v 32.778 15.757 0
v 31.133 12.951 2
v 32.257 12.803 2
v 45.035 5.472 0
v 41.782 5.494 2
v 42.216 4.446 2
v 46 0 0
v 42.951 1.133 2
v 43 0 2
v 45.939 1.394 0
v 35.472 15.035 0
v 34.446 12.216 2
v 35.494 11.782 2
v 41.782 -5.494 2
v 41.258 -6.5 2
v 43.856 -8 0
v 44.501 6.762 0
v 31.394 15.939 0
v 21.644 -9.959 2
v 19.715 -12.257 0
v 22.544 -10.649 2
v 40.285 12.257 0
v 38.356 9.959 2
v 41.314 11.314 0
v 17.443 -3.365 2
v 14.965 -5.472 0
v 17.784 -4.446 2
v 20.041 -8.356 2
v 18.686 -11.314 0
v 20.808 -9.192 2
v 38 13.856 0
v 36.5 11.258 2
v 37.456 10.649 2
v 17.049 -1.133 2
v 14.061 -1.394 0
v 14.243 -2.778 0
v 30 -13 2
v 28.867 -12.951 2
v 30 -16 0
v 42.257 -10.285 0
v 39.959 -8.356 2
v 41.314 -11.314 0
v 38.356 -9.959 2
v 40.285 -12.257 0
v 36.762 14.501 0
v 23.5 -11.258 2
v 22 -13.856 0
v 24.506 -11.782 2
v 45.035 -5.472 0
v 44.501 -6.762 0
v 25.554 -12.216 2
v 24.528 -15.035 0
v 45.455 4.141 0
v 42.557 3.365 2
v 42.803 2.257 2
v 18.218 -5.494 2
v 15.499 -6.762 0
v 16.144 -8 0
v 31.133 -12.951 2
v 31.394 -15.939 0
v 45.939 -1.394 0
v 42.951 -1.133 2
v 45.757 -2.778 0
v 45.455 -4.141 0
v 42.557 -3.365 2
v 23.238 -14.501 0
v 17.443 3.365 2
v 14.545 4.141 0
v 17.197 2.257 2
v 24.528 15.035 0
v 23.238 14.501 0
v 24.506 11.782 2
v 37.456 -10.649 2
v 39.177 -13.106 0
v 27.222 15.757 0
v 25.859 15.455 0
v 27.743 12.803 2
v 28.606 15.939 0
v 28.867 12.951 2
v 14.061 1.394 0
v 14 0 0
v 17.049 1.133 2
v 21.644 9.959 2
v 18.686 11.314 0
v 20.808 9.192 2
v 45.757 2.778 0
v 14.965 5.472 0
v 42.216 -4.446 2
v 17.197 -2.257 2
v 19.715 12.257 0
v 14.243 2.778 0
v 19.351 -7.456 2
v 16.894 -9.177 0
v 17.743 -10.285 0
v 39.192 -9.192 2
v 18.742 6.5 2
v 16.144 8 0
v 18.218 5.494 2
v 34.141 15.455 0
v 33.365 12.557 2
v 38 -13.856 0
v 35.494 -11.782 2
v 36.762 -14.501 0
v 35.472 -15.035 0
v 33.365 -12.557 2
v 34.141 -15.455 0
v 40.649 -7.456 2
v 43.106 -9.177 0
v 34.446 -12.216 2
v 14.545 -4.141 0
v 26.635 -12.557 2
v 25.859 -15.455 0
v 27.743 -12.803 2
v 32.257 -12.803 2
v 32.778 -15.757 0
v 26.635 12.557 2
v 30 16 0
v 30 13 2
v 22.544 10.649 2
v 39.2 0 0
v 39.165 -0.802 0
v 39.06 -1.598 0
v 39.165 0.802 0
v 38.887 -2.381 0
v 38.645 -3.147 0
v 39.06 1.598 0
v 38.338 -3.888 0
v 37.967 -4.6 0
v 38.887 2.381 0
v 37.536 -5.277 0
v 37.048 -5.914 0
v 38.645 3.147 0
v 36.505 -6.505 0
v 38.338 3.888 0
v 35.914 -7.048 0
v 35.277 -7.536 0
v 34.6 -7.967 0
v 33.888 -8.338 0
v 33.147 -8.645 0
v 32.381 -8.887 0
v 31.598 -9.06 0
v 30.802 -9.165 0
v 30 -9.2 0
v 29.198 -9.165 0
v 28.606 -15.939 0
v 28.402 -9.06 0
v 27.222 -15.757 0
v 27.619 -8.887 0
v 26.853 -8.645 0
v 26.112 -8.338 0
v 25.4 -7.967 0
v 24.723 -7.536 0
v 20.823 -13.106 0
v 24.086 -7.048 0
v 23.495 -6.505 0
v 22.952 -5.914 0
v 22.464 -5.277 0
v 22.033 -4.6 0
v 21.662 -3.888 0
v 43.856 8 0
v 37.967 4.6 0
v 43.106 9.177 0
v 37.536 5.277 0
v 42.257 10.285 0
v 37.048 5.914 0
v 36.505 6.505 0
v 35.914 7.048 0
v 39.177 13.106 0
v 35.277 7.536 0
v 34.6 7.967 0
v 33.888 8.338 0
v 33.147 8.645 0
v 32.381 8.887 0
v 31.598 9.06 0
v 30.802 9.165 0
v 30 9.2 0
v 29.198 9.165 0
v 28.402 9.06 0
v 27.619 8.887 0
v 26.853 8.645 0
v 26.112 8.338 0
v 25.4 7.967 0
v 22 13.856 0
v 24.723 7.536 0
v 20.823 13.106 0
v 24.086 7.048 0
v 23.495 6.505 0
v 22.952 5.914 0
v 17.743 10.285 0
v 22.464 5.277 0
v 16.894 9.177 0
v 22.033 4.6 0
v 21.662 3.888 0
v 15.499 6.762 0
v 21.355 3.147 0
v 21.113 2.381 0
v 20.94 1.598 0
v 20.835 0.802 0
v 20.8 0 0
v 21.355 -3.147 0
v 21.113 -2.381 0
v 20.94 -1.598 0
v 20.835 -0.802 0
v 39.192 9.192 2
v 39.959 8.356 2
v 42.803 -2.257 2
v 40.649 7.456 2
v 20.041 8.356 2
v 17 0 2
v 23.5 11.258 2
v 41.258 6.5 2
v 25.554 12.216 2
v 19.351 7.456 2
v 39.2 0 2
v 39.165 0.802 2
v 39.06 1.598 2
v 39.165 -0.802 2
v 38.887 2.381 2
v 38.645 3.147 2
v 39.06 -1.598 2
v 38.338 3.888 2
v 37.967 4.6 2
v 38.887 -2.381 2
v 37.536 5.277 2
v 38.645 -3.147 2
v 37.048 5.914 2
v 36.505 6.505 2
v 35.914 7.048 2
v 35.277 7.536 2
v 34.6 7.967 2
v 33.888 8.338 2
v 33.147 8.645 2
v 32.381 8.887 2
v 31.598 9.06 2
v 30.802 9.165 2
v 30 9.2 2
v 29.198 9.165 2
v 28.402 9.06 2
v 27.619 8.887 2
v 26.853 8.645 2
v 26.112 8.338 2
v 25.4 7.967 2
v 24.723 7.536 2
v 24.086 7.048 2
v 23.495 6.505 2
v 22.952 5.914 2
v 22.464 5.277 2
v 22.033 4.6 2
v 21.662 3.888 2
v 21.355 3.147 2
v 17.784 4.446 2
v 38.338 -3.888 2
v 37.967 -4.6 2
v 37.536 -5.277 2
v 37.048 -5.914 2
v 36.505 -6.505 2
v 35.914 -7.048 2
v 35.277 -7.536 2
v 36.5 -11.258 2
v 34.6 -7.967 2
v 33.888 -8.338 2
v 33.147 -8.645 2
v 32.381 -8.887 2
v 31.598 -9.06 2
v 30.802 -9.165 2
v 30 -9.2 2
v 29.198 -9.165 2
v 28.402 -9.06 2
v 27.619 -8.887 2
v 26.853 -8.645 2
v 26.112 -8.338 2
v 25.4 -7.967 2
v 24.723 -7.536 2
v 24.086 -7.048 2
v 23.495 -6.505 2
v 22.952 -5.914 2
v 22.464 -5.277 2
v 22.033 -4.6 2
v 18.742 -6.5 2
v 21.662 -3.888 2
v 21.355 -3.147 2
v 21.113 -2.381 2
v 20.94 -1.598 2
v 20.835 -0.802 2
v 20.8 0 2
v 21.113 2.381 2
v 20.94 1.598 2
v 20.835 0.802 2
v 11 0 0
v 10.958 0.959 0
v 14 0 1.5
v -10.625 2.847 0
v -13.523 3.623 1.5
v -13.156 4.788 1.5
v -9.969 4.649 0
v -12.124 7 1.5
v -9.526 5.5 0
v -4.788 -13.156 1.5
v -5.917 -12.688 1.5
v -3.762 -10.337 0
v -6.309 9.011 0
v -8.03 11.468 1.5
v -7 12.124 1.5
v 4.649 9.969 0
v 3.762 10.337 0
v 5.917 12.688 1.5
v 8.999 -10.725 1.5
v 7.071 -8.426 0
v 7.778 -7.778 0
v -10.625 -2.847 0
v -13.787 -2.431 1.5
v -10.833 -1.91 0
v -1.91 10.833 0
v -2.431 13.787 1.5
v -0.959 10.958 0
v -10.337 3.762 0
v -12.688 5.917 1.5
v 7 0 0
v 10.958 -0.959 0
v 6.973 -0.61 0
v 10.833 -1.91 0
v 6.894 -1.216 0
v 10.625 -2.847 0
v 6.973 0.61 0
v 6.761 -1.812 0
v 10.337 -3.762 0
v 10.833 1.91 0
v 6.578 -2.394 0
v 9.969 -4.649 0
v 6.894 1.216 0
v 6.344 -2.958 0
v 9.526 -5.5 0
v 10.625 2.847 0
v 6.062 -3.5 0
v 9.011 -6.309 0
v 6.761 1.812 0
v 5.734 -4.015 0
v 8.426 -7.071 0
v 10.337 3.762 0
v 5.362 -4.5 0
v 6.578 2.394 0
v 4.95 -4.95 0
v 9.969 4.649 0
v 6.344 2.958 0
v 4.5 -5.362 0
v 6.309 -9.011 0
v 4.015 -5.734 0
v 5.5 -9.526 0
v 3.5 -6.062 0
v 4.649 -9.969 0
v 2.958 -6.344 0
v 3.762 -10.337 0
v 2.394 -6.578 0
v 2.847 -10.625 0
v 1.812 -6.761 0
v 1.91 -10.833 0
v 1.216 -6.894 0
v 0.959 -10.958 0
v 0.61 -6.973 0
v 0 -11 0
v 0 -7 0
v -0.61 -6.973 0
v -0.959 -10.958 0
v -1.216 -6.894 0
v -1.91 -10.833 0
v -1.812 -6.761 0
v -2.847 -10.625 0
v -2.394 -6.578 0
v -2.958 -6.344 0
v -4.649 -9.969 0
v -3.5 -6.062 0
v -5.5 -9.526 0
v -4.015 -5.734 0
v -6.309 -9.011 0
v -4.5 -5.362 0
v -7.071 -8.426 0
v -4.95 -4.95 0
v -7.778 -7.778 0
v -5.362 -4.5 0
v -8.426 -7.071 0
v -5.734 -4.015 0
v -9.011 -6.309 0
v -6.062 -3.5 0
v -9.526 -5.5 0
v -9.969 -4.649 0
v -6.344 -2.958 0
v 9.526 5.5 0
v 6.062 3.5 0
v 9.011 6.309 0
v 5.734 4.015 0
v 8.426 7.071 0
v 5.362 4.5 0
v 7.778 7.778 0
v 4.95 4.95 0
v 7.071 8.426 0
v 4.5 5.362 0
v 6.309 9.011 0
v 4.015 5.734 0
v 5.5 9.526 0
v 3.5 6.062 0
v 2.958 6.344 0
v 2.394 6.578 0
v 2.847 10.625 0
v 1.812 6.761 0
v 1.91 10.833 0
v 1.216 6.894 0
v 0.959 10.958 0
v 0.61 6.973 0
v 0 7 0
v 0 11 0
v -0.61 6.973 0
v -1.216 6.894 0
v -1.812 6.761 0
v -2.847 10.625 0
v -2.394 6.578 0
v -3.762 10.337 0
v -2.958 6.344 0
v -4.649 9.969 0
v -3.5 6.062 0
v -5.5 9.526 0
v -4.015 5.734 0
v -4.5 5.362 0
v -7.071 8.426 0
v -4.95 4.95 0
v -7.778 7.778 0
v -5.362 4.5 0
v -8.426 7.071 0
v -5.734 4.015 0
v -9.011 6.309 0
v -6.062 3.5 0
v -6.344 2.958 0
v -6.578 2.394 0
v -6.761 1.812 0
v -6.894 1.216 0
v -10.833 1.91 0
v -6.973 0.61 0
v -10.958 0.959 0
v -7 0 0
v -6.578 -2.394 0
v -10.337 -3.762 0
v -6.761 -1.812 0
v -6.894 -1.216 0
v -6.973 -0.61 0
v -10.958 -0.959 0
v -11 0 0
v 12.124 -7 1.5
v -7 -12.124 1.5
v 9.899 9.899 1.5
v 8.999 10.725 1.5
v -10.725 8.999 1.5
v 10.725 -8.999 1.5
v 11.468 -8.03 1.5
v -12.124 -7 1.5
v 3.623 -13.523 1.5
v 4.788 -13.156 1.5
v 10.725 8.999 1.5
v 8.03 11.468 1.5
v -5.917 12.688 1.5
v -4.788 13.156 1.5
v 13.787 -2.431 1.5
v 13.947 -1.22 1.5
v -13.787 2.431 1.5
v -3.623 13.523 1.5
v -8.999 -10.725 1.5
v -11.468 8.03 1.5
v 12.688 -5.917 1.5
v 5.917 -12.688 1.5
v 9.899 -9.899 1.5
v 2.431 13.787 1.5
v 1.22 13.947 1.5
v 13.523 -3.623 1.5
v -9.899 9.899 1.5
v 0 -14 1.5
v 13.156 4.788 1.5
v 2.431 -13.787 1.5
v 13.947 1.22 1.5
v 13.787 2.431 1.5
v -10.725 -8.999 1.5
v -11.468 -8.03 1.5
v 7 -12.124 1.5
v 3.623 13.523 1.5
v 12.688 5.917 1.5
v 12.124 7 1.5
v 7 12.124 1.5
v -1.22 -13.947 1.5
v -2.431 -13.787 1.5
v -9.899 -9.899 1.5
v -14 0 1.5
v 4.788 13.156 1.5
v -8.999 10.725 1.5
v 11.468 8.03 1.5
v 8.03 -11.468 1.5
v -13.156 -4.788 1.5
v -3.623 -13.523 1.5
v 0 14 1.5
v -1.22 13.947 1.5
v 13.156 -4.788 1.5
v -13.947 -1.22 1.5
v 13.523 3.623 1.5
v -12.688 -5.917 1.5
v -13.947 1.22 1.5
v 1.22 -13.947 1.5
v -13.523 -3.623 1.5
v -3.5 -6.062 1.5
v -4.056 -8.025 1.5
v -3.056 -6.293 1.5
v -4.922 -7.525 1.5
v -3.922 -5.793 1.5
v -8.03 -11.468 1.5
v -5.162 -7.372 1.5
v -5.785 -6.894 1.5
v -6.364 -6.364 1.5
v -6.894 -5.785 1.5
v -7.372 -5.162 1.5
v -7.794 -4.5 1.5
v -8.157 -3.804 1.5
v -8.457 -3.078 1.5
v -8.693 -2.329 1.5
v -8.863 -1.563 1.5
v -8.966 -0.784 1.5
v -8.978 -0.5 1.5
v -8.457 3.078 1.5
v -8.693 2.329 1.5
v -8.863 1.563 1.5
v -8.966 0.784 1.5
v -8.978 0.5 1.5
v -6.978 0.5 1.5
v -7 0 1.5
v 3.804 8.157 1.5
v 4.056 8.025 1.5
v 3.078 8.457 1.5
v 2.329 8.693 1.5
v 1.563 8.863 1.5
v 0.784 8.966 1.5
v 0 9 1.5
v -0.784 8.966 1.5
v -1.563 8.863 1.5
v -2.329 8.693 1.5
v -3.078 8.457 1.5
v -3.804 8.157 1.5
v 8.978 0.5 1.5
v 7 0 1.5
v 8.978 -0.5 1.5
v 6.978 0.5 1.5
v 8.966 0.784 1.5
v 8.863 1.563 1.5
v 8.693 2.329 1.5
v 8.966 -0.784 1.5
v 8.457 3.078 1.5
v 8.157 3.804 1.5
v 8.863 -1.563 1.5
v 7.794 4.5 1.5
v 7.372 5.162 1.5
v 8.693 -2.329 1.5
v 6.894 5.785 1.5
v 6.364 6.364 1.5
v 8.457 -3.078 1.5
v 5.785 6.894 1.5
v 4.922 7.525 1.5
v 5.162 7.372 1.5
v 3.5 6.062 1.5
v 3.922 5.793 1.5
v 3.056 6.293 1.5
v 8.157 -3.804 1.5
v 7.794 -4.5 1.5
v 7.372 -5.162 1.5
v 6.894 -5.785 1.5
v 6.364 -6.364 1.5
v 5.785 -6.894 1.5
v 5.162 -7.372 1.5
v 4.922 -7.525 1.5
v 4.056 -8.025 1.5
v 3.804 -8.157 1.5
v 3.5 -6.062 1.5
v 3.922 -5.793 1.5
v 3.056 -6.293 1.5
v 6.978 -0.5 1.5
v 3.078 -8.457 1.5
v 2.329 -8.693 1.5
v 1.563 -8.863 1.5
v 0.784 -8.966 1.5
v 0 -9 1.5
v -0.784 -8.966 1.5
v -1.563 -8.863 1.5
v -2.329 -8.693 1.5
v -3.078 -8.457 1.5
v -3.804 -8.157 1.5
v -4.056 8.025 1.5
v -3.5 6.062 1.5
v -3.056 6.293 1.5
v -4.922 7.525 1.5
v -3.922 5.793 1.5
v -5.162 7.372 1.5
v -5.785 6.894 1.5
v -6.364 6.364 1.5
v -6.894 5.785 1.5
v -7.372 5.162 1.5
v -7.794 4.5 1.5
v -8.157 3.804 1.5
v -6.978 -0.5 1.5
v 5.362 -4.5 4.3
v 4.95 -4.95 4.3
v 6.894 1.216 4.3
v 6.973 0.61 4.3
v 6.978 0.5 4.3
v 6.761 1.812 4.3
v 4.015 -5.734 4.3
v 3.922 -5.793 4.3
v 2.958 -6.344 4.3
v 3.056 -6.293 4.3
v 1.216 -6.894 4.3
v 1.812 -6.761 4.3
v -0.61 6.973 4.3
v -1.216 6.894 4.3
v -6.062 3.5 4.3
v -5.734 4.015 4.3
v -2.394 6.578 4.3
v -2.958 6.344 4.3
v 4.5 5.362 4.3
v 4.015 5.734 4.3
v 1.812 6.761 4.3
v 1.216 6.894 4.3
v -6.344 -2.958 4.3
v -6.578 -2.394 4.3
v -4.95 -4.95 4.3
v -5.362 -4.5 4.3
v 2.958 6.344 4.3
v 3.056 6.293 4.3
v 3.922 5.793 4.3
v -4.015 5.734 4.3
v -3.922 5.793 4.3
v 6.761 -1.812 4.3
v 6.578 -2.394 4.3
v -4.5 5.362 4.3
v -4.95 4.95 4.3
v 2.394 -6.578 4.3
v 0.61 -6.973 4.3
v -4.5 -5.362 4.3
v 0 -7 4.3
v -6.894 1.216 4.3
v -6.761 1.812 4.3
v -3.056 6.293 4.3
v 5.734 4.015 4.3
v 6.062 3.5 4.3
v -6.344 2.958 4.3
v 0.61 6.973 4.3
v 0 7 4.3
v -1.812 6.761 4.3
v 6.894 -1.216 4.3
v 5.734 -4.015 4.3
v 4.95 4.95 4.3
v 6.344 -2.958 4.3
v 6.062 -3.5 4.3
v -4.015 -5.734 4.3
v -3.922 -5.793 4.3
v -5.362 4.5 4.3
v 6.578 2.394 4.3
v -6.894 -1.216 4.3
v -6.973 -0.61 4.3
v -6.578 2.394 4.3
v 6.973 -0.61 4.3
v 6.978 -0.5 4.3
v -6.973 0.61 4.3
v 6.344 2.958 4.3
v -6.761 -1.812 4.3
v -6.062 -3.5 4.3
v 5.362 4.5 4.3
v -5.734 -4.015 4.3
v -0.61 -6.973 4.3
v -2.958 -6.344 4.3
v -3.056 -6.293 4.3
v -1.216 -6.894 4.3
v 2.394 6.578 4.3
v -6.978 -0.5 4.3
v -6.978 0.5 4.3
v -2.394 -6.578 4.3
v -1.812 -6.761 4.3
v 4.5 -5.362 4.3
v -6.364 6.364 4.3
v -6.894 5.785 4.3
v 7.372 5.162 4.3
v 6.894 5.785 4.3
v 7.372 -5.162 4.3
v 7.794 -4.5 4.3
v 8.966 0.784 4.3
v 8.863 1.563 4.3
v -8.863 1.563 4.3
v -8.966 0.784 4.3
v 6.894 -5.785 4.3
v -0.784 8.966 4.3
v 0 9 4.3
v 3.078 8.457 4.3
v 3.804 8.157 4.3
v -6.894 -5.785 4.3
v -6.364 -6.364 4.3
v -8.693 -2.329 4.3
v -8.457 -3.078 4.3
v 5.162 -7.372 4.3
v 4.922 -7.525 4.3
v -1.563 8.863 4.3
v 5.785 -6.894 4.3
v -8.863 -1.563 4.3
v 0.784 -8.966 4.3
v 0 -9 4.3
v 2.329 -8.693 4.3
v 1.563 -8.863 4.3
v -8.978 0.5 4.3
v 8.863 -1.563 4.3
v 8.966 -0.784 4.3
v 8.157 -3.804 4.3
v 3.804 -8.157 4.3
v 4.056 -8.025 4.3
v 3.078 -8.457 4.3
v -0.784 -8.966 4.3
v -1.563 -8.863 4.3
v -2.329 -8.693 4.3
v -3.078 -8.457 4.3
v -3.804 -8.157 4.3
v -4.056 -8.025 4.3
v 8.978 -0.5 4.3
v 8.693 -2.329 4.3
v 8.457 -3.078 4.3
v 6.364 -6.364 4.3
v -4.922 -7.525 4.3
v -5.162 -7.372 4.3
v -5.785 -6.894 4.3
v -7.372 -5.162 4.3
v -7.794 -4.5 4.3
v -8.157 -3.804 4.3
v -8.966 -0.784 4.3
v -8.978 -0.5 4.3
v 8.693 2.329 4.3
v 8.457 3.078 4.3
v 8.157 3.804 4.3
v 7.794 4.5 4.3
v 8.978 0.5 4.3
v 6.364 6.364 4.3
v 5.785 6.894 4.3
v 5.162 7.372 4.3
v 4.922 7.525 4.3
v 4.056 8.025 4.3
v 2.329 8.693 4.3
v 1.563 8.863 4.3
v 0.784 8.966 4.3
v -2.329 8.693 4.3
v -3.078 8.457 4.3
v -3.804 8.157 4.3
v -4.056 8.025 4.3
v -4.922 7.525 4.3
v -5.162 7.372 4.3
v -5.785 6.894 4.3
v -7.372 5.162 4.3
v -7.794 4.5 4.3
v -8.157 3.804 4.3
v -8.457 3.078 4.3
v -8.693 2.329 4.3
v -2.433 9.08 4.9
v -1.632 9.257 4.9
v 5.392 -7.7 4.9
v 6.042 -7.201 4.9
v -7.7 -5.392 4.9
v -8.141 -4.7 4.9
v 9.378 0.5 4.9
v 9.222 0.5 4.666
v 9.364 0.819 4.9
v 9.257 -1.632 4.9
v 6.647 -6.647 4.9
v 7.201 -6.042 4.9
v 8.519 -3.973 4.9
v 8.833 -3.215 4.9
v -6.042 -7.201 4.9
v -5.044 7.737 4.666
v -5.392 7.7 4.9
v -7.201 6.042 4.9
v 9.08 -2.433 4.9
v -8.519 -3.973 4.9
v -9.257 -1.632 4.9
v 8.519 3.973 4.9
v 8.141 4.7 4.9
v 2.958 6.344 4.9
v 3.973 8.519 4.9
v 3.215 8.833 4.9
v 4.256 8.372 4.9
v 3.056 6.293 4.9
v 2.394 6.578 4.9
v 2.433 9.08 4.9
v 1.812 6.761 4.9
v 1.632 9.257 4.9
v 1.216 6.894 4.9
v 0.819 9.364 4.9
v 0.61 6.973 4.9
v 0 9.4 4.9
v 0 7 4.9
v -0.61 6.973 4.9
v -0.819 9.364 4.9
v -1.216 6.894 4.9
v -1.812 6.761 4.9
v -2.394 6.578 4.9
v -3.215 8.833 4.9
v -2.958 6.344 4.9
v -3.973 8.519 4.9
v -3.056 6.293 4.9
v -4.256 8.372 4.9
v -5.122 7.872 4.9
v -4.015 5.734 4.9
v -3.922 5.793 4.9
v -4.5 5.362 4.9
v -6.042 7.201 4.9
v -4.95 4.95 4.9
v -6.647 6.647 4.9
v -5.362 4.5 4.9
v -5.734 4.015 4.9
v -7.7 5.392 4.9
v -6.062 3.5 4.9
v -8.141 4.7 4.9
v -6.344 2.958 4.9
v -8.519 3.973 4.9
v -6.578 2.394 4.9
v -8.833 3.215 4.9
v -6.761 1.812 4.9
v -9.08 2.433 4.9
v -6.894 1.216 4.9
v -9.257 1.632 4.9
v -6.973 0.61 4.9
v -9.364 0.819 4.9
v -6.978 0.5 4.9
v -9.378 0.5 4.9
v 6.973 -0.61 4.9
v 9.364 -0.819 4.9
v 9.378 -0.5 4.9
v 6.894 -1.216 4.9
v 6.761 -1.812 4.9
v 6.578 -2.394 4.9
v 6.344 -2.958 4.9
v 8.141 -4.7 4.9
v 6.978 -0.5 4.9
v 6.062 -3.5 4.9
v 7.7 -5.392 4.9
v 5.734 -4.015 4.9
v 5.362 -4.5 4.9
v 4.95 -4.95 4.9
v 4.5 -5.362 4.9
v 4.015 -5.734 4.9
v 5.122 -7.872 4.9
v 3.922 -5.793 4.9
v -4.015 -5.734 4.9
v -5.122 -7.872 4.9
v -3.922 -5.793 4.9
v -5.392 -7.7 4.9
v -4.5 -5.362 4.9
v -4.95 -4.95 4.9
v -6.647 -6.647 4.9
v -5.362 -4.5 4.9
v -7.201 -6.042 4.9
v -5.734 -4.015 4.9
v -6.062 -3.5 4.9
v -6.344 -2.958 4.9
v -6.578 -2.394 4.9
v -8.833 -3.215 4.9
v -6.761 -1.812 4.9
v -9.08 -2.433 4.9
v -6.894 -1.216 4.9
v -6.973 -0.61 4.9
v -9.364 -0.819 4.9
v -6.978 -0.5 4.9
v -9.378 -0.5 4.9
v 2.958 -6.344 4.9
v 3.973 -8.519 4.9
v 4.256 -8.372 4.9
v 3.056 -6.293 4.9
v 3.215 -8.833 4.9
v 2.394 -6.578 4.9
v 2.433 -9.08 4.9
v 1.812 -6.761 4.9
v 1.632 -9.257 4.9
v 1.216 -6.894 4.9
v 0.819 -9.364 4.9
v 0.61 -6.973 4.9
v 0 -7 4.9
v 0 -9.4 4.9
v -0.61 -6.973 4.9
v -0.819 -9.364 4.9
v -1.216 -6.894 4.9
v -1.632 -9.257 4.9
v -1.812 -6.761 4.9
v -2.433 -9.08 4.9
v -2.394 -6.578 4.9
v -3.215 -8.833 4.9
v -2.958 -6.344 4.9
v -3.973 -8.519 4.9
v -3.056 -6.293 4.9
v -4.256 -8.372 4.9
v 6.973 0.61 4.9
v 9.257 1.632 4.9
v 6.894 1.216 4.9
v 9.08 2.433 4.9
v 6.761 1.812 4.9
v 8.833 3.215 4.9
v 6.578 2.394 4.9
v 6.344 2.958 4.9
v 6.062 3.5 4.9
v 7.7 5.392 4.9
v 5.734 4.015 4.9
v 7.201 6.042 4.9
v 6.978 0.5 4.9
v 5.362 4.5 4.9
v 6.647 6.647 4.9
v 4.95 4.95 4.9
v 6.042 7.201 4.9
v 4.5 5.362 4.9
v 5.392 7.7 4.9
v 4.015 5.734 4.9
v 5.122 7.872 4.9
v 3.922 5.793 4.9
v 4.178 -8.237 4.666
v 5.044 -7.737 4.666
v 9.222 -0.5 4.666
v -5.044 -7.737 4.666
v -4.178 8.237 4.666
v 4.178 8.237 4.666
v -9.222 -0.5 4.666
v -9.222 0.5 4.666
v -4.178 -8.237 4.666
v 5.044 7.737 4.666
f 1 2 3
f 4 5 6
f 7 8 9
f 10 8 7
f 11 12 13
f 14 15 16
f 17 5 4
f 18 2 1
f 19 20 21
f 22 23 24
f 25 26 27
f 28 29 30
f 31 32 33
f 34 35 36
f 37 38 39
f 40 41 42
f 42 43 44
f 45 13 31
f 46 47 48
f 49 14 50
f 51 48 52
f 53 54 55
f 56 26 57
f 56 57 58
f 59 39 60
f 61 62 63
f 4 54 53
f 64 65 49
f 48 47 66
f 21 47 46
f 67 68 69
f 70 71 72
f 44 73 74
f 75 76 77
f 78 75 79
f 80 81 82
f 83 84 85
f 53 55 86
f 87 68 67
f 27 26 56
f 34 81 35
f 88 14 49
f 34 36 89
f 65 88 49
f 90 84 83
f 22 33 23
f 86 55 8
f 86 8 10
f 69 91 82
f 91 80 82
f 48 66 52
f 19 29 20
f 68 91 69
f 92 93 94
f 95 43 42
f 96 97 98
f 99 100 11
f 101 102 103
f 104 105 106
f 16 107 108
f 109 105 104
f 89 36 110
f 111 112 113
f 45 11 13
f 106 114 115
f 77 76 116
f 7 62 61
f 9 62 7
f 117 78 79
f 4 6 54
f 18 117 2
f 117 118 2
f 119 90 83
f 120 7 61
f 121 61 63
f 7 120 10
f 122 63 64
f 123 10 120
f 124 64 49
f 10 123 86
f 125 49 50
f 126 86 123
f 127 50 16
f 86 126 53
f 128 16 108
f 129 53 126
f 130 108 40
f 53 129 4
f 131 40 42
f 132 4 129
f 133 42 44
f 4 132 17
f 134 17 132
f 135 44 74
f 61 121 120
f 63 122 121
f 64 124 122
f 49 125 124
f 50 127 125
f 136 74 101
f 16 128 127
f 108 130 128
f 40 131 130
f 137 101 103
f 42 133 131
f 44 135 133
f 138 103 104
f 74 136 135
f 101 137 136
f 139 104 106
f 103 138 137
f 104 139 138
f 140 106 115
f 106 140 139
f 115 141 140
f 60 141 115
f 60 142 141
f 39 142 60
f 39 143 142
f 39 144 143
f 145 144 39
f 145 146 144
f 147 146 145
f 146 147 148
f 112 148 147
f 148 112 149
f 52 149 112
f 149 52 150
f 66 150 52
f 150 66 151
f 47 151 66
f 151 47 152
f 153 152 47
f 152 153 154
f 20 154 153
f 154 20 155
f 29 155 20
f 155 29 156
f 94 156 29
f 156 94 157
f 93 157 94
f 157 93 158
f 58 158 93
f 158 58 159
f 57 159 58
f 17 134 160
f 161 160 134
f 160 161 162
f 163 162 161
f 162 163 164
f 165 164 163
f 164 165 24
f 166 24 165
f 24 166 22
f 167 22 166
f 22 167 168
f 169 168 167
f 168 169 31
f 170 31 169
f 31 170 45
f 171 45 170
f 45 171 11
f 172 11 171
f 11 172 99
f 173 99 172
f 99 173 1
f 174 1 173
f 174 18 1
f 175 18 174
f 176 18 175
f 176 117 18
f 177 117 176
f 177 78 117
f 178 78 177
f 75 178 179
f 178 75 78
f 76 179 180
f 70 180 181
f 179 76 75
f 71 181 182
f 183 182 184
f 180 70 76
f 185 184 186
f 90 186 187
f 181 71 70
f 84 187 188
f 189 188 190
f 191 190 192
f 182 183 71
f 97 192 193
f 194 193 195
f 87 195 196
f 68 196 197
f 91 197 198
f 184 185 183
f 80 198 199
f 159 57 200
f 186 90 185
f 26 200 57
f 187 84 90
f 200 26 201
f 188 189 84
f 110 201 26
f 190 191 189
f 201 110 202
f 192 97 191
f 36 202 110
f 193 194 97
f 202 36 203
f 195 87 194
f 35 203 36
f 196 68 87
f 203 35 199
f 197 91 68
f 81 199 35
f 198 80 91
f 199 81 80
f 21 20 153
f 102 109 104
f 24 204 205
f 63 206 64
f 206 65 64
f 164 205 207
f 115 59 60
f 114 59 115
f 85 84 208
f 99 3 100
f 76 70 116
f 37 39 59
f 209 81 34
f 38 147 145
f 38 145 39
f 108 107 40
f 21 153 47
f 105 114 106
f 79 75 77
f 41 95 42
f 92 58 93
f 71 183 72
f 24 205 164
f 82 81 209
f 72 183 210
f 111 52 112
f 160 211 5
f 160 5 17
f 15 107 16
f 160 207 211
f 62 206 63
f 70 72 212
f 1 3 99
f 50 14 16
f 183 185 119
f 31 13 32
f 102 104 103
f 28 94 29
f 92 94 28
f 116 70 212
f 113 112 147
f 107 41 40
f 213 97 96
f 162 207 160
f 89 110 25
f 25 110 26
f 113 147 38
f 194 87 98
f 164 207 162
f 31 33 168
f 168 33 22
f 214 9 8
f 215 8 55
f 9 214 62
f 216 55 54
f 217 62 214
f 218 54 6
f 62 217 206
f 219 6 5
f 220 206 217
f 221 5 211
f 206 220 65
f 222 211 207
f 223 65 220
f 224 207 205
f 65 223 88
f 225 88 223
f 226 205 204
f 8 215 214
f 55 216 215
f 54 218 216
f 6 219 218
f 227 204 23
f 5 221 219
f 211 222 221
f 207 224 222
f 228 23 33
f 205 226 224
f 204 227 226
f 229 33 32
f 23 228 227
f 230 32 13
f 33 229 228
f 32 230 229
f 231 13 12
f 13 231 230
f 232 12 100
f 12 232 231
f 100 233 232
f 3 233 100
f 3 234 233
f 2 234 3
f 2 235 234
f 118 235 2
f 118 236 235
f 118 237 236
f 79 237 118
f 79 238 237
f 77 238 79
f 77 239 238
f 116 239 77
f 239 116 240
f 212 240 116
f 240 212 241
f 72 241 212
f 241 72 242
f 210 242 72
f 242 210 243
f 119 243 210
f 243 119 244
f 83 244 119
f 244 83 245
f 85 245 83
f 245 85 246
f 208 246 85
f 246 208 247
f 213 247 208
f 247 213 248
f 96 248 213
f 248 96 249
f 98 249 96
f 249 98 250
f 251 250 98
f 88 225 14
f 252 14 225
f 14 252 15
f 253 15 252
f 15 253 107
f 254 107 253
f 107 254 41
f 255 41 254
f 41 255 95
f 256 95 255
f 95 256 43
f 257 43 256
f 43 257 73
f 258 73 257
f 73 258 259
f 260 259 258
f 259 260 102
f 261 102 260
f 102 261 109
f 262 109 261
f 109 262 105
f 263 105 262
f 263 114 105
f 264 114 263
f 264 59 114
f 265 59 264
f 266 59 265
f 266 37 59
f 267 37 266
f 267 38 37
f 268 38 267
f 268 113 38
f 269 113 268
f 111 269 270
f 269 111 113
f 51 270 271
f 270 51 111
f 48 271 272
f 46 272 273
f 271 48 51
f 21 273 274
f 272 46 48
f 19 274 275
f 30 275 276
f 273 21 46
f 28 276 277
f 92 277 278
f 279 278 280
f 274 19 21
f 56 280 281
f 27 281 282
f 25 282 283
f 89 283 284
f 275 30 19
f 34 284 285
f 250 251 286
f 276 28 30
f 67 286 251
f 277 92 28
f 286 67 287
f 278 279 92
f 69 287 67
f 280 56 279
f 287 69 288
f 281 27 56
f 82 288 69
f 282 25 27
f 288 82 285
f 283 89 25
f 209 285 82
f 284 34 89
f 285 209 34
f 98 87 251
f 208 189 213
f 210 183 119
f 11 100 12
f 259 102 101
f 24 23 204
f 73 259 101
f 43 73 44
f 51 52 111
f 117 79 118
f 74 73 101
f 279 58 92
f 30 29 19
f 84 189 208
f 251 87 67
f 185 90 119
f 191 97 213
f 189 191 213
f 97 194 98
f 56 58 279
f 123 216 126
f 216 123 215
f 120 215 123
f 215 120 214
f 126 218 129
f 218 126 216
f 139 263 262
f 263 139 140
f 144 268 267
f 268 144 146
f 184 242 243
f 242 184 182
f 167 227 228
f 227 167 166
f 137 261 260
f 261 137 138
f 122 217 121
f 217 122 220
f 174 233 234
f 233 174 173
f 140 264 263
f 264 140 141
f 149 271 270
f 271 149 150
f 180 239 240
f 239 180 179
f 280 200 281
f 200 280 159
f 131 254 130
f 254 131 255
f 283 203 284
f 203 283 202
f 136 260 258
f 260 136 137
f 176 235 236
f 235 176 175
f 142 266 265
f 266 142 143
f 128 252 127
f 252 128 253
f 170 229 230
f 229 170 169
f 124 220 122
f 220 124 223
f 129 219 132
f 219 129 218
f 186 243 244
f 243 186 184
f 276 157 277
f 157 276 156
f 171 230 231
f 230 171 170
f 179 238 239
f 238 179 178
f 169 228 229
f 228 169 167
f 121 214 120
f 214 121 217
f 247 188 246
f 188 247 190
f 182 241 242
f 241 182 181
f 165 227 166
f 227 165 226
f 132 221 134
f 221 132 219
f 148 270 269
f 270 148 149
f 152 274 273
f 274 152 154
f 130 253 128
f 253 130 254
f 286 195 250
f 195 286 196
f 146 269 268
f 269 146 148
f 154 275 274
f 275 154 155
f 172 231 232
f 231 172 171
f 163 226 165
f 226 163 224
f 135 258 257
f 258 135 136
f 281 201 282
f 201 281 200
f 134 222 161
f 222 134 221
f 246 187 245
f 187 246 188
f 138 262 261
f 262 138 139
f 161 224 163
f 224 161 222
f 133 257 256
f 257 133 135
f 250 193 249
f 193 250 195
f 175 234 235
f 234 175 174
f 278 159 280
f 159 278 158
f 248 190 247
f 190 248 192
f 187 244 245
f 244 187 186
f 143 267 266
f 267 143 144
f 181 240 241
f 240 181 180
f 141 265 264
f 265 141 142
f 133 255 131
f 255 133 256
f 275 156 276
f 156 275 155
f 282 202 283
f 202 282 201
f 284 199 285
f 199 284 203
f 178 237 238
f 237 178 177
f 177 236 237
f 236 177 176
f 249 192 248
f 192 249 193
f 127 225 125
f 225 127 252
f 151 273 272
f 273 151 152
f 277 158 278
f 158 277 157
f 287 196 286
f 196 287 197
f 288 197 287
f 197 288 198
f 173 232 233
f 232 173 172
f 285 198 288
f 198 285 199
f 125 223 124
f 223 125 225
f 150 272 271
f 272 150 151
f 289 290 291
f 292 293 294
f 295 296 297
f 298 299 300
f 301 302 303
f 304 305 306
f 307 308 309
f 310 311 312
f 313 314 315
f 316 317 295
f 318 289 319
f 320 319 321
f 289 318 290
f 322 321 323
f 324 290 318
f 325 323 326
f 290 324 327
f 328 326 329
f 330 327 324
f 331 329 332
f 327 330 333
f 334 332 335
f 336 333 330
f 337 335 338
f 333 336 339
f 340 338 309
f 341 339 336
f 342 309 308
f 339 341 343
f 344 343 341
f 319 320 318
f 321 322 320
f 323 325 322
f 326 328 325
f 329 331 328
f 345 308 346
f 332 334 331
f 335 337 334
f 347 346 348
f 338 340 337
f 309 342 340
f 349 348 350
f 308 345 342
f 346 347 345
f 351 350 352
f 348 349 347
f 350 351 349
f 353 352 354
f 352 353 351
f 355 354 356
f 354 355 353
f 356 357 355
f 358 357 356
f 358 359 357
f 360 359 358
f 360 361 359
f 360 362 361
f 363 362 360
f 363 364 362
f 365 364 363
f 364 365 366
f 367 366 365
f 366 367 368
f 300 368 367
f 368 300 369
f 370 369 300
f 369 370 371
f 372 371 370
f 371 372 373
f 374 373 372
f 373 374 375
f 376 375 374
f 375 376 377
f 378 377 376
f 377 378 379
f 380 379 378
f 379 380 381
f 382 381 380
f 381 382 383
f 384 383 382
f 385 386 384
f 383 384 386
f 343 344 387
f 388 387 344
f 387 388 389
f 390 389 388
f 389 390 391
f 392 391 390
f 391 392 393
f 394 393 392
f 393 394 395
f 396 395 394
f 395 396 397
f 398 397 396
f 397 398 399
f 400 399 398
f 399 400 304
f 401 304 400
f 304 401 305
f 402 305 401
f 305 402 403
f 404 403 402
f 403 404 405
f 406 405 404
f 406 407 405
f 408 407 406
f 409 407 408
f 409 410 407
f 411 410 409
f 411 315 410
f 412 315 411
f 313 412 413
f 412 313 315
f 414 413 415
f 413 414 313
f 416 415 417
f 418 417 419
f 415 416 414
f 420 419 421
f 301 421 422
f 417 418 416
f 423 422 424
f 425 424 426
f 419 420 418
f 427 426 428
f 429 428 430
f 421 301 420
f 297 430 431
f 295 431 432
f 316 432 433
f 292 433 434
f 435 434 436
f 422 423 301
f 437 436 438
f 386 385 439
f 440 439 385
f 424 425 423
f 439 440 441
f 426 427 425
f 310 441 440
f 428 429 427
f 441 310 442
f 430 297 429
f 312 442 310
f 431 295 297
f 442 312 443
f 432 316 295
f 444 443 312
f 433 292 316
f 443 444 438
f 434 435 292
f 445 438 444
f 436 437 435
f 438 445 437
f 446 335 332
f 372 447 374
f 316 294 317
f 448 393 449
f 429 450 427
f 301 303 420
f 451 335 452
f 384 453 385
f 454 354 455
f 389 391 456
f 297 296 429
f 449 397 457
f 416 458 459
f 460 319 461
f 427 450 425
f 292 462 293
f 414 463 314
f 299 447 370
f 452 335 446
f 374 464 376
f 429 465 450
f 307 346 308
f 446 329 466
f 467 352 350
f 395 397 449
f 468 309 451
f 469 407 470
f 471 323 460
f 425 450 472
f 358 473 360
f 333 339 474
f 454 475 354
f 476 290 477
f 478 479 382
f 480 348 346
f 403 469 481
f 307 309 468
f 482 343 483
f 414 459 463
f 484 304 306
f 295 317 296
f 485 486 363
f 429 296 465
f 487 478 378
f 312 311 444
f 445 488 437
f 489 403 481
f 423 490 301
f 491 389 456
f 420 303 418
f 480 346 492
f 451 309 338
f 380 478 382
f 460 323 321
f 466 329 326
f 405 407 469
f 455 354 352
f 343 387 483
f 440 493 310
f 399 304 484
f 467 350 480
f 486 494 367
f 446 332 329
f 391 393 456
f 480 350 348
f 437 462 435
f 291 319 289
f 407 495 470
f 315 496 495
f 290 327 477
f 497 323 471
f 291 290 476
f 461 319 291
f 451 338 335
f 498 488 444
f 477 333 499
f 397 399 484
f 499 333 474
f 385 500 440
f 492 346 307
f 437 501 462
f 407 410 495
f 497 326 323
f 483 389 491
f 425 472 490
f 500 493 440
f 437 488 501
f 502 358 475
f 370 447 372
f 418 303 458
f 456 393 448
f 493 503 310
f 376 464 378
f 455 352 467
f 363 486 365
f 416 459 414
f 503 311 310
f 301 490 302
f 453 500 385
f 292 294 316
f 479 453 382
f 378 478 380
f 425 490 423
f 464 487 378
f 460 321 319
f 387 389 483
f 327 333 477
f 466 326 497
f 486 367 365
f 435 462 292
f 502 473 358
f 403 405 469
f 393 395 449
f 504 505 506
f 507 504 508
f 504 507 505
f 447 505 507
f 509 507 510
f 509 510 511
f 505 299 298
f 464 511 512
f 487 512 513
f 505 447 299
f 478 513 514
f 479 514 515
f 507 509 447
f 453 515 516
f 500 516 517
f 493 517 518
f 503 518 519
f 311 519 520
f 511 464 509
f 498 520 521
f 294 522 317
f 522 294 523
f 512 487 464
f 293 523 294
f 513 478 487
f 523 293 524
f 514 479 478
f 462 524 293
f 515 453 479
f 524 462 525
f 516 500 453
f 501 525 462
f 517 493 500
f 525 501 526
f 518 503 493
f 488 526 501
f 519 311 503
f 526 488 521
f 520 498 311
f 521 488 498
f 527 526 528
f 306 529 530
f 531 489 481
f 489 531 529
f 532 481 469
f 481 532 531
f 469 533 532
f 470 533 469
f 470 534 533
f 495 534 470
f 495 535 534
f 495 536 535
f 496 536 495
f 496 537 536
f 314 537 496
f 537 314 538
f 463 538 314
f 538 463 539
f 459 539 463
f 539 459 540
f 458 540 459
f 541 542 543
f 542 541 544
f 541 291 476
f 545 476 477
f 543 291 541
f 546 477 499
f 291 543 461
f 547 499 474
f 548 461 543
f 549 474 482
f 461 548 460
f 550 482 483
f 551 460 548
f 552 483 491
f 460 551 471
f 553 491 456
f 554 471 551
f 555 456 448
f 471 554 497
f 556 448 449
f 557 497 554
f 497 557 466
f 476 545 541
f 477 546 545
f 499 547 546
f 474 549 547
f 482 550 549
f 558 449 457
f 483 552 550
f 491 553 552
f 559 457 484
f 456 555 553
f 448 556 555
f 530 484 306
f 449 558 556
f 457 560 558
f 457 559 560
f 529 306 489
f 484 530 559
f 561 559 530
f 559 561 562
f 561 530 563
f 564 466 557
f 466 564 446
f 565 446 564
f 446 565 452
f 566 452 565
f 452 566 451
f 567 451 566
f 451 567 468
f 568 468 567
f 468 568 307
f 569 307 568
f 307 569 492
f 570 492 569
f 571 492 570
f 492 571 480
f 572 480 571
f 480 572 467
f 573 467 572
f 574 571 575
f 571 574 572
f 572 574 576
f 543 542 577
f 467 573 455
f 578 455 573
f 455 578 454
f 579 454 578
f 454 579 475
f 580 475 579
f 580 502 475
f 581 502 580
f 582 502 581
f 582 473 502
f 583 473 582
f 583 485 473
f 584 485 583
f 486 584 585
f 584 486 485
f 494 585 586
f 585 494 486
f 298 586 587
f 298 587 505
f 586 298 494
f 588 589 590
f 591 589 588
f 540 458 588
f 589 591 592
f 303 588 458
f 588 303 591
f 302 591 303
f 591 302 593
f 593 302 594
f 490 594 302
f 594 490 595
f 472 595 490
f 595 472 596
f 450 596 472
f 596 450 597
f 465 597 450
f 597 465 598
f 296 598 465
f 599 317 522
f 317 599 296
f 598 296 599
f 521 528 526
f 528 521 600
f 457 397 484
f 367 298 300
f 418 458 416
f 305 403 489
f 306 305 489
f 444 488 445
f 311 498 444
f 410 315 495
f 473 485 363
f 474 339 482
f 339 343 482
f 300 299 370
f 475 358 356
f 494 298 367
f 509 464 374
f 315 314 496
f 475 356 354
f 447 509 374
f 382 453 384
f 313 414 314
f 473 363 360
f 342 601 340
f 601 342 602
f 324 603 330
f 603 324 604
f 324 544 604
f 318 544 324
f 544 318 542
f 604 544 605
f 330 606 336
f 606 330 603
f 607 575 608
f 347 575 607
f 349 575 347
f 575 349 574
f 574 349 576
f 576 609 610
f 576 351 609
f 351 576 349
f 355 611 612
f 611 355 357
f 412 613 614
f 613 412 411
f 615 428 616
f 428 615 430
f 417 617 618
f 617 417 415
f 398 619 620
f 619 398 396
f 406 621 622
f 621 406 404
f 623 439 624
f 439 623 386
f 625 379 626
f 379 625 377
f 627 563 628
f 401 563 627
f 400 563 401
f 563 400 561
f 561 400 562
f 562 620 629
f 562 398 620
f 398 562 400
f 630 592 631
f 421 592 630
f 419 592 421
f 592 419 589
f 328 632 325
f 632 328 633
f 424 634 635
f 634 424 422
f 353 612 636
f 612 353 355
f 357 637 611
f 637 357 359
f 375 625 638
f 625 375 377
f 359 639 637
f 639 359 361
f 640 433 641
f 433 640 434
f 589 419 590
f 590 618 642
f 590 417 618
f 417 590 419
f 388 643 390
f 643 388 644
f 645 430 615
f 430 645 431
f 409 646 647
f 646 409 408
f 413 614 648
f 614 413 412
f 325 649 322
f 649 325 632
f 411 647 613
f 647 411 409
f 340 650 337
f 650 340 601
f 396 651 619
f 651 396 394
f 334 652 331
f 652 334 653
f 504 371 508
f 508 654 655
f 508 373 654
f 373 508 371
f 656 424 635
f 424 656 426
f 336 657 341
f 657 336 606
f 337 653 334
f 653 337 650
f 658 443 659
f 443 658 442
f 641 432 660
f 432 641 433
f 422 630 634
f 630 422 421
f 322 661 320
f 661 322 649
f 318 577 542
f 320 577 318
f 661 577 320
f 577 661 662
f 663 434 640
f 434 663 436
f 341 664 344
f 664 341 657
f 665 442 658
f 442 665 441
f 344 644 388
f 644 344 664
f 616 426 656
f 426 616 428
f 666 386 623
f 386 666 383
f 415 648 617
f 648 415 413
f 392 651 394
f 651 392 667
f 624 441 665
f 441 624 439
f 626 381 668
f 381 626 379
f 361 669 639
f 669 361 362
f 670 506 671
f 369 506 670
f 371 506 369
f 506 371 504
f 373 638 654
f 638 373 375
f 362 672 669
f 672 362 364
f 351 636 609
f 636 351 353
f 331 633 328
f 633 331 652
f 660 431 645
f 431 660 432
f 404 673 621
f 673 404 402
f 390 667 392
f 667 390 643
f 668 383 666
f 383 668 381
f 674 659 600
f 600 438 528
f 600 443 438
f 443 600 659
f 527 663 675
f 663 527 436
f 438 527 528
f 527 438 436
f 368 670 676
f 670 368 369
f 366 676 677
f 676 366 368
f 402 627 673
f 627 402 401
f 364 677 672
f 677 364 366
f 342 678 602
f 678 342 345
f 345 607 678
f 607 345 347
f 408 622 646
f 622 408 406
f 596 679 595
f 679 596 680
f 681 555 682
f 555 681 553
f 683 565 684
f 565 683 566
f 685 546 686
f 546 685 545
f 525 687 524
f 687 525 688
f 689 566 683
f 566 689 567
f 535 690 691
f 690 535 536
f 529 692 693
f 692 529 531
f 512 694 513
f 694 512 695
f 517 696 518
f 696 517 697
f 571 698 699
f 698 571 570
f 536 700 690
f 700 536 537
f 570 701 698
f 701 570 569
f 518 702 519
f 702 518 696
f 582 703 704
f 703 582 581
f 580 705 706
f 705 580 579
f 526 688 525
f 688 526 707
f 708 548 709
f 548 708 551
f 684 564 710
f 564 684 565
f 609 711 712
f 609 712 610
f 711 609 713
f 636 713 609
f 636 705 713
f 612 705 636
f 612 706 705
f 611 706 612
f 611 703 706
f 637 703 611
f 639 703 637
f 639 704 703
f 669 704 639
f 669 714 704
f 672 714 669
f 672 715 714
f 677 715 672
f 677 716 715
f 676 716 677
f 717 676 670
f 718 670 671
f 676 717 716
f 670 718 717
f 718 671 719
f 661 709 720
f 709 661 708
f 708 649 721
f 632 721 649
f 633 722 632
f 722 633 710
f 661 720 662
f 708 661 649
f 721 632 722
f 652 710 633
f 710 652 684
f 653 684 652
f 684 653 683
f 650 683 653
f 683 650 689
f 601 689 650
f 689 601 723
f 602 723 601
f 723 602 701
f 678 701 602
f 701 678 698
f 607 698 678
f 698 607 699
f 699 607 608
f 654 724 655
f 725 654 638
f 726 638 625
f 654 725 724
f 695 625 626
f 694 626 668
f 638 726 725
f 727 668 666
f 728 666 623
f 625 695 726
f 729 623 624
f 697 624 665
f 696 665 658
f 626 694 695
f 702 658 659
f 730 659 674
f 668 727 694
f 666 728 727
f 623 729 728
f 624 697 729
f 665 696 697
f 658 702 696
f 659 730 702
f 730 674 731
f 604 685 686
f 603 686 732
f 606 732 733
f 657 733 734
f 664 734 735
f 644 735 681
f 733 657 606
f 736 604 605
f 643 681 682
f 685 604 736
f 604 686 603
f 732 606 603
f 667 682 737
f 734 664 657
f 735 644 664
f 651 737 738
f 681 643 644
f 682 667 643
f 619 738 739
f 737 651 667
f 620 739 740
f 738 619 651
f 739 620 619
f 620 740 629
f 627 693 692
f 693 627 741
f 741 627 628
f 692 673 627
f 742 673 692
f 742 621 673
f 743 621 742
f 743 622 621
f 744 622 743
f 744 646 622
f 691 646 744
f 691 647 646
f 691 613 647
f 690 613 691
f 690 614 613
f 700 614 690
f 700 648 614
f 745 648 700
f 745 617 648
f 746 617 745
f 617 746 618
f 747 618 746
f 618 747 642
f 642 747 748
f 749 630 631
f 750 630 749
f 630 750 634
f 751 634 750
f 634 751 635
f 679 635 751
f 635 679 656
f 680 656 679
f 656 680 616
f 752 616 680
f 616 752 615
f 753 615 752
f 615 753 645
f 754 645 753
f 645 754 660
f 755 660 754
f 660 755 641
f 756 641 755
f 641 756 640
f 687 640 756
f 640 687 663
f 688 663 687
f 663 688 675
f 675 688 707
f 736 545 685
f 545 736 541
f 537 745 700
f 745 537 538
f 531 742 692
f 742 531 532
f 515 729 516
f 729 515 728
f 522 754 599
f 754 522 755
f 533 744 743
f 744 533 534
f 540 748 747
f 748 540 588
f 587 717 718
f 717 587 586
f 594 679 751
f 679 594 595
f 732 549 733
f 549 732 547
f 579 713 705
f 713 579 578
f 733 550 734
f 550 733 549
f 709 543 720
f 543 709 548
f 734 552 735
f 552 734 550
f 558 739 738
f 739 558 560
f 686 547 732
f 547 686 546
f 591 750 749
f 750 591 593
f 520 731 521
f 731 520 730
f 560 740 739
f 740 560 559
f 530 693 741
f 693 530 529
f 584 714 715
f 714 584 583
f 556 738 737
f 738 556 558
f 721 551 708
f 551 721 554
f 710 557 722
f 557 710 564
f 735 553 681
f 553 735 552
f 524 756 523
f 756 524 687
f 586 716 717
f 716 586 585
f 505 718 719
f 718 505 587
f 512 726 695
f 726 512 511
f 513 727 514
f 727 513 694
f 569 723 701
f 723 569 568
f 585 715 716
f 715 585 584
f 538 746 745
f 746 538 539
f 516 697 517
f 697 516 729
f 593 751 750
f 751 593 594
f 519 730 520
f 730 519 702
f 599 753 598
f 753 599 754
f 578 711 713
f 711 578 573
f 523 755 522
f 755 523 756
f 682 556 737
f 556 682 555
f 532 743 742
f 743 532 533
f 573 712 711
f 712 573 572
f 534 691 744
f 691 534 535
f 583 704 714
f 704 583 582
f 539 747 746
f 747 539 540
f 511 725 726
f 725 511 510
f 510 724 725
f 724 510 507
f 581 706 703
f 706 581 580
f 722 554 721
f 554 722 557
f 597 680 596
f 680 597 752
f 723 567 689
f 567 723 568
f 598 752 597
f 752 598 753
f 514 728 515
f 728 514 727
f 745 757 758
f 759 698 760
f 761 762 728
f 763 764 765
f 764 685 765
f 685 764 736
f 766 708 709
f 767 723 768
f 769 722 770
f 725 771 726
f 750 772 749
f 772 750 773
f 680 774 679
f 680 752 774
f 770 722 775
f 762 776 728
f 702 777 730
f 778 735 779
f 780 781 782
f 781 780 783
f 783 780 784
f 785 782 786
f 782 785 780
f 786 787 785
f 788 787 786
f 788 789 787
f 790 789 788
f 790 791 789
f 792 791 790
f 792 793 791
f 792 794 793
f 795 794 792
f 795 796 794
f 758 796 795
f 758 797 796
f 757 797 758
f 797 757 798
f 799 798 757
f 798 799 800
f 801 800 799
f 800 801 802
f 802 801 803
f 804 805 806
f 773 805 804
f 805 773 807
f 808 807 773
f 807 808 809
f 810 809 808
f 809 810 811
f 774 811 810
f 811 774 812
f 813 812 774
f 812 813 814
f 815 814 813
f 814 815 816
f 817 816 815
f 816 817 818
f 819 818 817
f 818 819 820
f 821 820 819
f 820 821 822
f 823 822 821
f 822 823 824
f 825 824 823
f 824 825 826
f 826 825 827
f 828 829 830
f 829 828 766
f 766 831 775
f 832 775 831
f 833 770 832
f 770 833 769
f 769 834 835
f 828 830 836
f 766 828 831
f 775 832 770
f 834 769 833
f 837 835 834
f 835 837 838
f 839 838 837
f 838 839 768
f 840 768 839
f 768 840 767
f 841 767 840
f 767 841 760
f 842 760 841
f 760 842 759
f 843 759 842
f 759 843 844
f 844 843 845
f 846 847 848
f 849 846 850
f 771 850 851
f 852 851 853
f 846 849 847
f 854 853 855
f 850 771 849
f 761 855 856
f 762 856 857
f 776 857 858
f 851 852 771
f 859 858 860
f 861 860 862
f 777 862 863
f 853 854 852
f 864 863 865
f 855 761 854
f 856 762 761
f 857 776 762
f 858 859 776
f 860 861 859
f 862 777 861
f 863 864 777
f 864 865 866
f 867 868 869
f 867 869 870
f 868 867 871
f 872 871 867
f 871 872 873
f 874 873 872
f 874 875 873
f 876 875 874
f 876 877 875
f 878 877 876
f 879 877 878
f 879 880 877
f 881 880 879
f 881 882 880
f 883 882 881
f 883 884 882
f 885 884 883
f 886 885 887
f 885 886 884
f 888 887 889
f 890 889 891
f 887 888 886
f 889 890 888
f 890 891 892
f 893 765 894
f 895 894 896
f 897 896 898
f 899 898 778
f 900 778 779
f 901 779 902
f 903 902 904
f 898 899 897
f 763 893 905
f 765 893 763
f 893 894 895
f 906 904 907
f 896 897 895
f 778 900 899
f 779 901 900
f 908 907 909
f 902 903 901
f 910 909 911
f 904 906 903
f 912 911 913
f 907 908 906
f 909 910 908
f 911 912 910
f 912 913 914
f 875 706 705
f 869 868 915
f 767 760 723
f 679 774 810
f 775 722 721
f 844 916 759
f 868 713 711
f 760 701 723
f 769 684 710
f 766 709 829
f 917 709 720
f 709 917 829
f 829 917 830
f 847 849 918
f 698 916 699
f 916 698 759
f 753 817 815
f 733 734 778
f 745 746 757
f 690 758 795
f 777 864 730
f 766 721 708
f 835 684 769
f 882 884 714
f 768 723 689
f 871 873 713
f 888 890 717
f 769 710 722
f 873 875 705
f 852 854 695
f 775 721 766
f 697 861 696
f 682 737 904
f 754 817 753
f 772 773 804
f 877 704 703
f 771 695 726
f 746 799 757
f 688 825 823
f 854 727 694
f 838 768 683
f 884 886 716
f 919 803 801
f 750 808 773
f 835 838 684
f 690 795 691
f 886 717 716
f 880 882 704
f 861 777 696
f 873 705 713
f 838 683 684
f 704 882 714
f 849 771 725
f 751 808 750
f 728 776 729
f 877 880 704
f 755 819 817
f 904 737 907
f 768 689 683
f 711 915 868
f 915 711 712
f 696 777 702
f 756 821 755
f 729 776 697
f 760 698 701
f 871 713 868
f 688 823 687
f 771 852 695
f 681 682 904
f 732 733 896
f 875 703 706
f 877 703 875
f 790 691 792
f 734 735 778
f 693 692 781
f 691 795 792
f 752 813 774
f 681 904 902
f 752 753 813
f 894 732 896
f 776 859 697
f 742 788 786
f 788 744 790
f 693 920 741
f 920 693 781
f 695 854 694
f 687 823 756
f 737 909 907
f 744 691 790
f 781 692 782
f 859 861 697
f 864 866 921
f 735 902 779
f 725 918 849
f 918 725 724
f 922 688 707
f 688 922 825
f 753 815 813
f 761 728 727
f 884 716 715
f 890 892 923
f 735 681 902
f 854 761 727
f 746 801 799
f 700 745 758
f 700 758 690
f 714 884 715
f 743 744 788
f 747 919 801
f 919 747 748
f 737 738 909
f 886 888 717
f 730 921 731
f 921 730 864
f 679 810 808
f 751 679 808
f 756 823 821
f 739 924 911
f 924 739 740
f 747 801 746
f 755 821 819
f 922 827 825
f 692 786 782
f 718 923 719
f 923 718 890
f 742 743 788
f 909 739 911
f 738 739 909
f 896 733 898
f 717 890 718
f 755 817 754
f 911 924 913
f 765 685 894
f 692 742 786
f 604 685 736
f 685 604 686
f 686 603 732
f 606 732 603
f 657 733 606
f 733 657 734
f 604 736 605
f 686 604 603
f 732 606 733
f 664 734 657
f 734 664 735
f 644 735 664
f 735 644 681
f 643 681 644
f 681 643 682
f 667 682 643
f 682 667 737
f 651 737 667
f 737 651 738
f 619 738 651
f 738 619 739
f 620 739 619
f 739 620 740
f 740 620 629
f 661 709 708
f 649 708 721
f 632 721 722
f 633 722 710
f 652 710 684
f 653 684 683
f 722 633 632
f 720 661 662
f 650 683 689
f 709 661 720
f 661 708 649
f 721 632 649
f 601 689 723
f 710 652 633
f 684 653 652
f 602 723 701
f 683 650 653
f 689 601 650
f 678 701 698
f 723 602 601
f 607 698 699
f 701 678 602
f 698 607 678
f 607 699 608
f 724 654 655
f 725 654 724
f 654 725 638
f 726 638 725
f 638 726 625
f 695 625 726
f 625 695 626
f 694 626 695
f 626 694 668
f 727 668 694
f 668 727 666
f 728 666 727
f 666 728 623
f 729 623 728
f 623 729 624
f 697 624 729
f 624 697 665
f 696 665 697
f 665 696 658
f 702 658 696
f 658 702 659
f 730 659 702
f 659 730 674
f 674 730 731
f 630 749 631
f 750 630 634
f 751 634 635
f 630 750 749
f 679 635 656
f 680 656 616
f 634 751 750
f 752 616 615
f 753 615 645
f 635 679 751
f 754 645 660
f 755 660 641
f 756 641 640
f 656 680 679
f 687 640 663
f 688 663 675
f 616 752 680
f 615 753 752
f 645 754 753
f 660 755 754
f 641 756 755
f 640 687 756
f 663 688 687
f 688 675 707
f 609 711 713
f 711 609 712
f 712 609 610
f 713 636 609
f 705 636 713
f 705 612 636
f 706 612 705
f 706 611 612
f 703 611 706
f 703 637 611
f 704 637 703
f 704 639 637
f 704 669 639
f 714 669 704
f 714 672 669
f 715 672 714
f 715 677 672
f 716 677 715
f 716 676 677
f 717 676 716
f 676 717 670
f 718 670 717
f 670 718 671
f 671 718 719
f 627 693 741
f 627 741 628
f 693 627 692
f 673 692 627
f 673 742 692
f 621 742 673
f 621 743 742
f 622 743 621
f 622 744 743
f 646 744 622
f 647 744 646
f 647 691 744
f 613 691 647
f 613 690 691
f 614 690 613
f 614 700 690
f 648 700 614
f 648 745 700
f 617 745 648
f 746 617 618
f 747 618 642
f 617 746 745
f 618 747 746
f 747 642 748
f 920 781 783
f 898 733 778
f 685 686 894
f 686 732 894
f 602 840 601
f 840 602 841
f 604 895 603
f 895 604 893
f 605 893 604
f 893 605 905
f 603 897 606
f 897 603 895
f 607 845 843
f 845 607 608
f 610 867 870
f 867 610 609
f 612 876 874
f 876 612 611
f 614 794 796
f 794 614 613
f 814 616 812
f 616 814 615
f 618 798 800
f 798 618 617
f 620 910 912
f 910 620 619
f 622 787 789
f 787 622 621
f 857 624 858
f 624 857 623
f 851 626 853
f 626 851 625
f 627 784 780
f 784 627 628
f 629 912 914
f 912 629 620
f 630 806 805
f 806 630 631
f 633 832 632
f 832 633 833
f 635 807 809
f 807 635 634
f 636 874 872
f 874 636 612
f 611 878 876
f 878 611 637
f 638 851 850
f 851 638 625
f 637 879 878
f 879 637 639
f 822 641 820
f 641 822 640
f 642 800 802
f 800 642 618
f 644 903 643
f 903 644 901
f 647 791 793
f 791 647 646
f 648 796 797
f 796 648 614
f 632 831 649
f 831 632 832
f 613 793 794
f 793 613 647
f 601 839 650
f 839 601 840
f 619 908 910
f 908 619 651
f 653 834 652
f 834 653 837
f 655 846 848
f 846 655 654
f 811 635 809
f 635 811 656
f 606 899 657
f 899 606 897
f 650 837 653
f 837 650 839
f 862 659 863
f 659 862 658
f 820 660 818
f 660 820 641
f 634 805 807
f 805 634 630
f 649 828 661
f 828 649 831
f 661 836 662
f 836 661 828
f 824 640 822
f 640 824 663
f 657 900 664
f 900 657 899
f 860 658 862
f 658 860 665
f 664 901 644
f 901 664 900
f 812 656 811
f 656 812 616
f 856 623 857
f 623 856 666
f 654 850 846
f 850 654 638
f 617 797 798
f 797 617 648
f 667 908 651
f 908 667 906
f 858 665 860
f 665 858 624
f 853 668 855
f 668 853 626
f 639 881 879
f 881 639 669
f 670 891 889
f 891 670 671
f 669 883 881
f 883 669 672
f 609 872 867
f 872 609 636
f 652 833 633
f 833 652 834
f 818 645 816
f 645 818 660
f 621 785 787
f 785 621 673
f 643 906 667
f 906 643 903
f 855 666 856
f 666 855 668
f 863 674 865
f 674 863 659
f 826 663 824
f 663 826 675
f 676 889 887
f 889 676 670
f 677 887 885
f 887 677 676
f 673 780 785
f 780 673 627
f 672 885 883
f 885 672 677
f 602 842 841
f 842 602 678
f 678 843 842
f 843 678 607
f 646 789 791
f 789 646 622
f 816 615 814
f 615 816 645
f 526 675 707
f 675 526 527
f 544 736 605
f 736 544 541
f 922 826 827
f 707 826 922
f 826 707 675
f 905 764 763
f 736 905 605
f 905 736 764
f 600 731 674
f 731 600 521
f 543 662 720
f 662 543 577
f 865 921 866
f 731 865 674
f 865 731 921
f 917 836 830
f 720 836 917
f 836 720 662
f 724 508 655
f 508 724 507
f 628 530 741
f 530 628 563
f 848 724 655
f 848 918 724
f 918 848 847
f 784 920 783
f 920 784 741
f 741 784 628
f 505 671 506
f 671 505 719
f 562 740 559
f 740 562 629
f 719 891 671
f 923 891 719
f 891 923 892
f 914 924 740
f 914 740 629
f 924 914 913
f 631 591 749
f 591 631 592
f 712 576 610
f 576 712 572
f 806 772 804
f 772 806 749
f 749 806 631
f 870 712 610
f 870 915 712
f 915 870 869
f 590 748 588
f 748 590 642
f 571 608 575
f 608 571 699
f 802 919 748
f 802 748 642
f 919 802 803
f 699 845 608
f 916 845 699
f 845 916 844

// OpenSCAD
$fn=72;

eyeletRingDiameterOffset = 0.2;
eyeletRingTopWidth = 4;
eyeletRingBottomWidth = 7;
eyeletRingHeight= 2;

eyeletDiameter = 14;
outerTopWidth = 7;
outerBottomWidth = 4;
baseHeigth = 1.5;

hookRingWidth=2;
hookRingHeight=2.8;

hookTopWidth = 0.5;
hookMiddleWidth=2.4;
hookTopHeight = 0.0;
hookMiddleHeight = 0.6;

numberOfSplits = 3;
hookSplitWidth = 1;


eyelet();

module eyelet() {
		translate([eyeletDiameter+max(outerBottomWidth,outerTopWidth)+max(eyeletRingTopWidth,eyeletRingBottomWidth)+2,0,0]) {

		difference() {


			cylinder(h=eyeletRingHeight,r1=eyeletDiameter/2+hookRingWidth+eyeletRingBottomWidth,r2=eyeletDiameter/2+hookRingWidth+eyeletRingTopWidth);
					translate([0,0,-0.1]) {
						cylinder(h=eyeletRingHeight+0.2,r=eyeletDiameter/2+hookRingWidth+eyeletRingDiameterOffset);
					}
			}
		}



		//-------------------BASE
		difference() {

		cylinder(h=baseHeigth,r1=eyeletDiameter/2+outerBottomWidth,r2=eyeletDiameter/2+outerTopWidth);

			translate([0,0,-0.1]) {
				cylinder(h=baseHeigth+0.2,r=eyeletDiameter/2);
			}
		}

		difference() {
		//-------------------HOOK RING

			union() {
				translate([0,0,baseHeigth]) {
				difference() {
				cylinder(h=hookRingHeight,r=eyeletDiameter/2+hookRingWidth);

				translate([0,0,-0.1]) {
					cylinder(h=hookRingHeight+0.2,r=eyeletDiameter/2);
				}}
				}


				//-------------------HOOK

				translate([0,0,baseHeigth+hookRingHeight]) {

				difference() {
					union() {
						cylinder(h=hookMiddleHeight,r1=eyeletDiameter/2+hookRingWidth,r2=eyeletDiameter/2+hookMiddleWidth);
						translate([0,0,hookMiddleHeight]) {
						cylinder(h=hookTopHeight,r1=eyeletDiameter/2+hookMiddleWidth,r2=eyeletDiameter/2+hookTopWidth);

						}
					}
					translate([0,0,-0.1]) {
						cylinder(h=hookMiddleHeight+hookTopHeight+0.2,r=eyeletDiameter/2);
					}
				}

				}
			}


		// HOOK SPLITS

			for(pos=[0:1:numberOfSplits]) {

				rotate([0,0,(180 / numberOfSplits)*pos]) {
					translate([0,0,baseHeigth+30]) {
					cube([500,hookSplitWidth,60],true);
					}
				}
			}
		}
}

